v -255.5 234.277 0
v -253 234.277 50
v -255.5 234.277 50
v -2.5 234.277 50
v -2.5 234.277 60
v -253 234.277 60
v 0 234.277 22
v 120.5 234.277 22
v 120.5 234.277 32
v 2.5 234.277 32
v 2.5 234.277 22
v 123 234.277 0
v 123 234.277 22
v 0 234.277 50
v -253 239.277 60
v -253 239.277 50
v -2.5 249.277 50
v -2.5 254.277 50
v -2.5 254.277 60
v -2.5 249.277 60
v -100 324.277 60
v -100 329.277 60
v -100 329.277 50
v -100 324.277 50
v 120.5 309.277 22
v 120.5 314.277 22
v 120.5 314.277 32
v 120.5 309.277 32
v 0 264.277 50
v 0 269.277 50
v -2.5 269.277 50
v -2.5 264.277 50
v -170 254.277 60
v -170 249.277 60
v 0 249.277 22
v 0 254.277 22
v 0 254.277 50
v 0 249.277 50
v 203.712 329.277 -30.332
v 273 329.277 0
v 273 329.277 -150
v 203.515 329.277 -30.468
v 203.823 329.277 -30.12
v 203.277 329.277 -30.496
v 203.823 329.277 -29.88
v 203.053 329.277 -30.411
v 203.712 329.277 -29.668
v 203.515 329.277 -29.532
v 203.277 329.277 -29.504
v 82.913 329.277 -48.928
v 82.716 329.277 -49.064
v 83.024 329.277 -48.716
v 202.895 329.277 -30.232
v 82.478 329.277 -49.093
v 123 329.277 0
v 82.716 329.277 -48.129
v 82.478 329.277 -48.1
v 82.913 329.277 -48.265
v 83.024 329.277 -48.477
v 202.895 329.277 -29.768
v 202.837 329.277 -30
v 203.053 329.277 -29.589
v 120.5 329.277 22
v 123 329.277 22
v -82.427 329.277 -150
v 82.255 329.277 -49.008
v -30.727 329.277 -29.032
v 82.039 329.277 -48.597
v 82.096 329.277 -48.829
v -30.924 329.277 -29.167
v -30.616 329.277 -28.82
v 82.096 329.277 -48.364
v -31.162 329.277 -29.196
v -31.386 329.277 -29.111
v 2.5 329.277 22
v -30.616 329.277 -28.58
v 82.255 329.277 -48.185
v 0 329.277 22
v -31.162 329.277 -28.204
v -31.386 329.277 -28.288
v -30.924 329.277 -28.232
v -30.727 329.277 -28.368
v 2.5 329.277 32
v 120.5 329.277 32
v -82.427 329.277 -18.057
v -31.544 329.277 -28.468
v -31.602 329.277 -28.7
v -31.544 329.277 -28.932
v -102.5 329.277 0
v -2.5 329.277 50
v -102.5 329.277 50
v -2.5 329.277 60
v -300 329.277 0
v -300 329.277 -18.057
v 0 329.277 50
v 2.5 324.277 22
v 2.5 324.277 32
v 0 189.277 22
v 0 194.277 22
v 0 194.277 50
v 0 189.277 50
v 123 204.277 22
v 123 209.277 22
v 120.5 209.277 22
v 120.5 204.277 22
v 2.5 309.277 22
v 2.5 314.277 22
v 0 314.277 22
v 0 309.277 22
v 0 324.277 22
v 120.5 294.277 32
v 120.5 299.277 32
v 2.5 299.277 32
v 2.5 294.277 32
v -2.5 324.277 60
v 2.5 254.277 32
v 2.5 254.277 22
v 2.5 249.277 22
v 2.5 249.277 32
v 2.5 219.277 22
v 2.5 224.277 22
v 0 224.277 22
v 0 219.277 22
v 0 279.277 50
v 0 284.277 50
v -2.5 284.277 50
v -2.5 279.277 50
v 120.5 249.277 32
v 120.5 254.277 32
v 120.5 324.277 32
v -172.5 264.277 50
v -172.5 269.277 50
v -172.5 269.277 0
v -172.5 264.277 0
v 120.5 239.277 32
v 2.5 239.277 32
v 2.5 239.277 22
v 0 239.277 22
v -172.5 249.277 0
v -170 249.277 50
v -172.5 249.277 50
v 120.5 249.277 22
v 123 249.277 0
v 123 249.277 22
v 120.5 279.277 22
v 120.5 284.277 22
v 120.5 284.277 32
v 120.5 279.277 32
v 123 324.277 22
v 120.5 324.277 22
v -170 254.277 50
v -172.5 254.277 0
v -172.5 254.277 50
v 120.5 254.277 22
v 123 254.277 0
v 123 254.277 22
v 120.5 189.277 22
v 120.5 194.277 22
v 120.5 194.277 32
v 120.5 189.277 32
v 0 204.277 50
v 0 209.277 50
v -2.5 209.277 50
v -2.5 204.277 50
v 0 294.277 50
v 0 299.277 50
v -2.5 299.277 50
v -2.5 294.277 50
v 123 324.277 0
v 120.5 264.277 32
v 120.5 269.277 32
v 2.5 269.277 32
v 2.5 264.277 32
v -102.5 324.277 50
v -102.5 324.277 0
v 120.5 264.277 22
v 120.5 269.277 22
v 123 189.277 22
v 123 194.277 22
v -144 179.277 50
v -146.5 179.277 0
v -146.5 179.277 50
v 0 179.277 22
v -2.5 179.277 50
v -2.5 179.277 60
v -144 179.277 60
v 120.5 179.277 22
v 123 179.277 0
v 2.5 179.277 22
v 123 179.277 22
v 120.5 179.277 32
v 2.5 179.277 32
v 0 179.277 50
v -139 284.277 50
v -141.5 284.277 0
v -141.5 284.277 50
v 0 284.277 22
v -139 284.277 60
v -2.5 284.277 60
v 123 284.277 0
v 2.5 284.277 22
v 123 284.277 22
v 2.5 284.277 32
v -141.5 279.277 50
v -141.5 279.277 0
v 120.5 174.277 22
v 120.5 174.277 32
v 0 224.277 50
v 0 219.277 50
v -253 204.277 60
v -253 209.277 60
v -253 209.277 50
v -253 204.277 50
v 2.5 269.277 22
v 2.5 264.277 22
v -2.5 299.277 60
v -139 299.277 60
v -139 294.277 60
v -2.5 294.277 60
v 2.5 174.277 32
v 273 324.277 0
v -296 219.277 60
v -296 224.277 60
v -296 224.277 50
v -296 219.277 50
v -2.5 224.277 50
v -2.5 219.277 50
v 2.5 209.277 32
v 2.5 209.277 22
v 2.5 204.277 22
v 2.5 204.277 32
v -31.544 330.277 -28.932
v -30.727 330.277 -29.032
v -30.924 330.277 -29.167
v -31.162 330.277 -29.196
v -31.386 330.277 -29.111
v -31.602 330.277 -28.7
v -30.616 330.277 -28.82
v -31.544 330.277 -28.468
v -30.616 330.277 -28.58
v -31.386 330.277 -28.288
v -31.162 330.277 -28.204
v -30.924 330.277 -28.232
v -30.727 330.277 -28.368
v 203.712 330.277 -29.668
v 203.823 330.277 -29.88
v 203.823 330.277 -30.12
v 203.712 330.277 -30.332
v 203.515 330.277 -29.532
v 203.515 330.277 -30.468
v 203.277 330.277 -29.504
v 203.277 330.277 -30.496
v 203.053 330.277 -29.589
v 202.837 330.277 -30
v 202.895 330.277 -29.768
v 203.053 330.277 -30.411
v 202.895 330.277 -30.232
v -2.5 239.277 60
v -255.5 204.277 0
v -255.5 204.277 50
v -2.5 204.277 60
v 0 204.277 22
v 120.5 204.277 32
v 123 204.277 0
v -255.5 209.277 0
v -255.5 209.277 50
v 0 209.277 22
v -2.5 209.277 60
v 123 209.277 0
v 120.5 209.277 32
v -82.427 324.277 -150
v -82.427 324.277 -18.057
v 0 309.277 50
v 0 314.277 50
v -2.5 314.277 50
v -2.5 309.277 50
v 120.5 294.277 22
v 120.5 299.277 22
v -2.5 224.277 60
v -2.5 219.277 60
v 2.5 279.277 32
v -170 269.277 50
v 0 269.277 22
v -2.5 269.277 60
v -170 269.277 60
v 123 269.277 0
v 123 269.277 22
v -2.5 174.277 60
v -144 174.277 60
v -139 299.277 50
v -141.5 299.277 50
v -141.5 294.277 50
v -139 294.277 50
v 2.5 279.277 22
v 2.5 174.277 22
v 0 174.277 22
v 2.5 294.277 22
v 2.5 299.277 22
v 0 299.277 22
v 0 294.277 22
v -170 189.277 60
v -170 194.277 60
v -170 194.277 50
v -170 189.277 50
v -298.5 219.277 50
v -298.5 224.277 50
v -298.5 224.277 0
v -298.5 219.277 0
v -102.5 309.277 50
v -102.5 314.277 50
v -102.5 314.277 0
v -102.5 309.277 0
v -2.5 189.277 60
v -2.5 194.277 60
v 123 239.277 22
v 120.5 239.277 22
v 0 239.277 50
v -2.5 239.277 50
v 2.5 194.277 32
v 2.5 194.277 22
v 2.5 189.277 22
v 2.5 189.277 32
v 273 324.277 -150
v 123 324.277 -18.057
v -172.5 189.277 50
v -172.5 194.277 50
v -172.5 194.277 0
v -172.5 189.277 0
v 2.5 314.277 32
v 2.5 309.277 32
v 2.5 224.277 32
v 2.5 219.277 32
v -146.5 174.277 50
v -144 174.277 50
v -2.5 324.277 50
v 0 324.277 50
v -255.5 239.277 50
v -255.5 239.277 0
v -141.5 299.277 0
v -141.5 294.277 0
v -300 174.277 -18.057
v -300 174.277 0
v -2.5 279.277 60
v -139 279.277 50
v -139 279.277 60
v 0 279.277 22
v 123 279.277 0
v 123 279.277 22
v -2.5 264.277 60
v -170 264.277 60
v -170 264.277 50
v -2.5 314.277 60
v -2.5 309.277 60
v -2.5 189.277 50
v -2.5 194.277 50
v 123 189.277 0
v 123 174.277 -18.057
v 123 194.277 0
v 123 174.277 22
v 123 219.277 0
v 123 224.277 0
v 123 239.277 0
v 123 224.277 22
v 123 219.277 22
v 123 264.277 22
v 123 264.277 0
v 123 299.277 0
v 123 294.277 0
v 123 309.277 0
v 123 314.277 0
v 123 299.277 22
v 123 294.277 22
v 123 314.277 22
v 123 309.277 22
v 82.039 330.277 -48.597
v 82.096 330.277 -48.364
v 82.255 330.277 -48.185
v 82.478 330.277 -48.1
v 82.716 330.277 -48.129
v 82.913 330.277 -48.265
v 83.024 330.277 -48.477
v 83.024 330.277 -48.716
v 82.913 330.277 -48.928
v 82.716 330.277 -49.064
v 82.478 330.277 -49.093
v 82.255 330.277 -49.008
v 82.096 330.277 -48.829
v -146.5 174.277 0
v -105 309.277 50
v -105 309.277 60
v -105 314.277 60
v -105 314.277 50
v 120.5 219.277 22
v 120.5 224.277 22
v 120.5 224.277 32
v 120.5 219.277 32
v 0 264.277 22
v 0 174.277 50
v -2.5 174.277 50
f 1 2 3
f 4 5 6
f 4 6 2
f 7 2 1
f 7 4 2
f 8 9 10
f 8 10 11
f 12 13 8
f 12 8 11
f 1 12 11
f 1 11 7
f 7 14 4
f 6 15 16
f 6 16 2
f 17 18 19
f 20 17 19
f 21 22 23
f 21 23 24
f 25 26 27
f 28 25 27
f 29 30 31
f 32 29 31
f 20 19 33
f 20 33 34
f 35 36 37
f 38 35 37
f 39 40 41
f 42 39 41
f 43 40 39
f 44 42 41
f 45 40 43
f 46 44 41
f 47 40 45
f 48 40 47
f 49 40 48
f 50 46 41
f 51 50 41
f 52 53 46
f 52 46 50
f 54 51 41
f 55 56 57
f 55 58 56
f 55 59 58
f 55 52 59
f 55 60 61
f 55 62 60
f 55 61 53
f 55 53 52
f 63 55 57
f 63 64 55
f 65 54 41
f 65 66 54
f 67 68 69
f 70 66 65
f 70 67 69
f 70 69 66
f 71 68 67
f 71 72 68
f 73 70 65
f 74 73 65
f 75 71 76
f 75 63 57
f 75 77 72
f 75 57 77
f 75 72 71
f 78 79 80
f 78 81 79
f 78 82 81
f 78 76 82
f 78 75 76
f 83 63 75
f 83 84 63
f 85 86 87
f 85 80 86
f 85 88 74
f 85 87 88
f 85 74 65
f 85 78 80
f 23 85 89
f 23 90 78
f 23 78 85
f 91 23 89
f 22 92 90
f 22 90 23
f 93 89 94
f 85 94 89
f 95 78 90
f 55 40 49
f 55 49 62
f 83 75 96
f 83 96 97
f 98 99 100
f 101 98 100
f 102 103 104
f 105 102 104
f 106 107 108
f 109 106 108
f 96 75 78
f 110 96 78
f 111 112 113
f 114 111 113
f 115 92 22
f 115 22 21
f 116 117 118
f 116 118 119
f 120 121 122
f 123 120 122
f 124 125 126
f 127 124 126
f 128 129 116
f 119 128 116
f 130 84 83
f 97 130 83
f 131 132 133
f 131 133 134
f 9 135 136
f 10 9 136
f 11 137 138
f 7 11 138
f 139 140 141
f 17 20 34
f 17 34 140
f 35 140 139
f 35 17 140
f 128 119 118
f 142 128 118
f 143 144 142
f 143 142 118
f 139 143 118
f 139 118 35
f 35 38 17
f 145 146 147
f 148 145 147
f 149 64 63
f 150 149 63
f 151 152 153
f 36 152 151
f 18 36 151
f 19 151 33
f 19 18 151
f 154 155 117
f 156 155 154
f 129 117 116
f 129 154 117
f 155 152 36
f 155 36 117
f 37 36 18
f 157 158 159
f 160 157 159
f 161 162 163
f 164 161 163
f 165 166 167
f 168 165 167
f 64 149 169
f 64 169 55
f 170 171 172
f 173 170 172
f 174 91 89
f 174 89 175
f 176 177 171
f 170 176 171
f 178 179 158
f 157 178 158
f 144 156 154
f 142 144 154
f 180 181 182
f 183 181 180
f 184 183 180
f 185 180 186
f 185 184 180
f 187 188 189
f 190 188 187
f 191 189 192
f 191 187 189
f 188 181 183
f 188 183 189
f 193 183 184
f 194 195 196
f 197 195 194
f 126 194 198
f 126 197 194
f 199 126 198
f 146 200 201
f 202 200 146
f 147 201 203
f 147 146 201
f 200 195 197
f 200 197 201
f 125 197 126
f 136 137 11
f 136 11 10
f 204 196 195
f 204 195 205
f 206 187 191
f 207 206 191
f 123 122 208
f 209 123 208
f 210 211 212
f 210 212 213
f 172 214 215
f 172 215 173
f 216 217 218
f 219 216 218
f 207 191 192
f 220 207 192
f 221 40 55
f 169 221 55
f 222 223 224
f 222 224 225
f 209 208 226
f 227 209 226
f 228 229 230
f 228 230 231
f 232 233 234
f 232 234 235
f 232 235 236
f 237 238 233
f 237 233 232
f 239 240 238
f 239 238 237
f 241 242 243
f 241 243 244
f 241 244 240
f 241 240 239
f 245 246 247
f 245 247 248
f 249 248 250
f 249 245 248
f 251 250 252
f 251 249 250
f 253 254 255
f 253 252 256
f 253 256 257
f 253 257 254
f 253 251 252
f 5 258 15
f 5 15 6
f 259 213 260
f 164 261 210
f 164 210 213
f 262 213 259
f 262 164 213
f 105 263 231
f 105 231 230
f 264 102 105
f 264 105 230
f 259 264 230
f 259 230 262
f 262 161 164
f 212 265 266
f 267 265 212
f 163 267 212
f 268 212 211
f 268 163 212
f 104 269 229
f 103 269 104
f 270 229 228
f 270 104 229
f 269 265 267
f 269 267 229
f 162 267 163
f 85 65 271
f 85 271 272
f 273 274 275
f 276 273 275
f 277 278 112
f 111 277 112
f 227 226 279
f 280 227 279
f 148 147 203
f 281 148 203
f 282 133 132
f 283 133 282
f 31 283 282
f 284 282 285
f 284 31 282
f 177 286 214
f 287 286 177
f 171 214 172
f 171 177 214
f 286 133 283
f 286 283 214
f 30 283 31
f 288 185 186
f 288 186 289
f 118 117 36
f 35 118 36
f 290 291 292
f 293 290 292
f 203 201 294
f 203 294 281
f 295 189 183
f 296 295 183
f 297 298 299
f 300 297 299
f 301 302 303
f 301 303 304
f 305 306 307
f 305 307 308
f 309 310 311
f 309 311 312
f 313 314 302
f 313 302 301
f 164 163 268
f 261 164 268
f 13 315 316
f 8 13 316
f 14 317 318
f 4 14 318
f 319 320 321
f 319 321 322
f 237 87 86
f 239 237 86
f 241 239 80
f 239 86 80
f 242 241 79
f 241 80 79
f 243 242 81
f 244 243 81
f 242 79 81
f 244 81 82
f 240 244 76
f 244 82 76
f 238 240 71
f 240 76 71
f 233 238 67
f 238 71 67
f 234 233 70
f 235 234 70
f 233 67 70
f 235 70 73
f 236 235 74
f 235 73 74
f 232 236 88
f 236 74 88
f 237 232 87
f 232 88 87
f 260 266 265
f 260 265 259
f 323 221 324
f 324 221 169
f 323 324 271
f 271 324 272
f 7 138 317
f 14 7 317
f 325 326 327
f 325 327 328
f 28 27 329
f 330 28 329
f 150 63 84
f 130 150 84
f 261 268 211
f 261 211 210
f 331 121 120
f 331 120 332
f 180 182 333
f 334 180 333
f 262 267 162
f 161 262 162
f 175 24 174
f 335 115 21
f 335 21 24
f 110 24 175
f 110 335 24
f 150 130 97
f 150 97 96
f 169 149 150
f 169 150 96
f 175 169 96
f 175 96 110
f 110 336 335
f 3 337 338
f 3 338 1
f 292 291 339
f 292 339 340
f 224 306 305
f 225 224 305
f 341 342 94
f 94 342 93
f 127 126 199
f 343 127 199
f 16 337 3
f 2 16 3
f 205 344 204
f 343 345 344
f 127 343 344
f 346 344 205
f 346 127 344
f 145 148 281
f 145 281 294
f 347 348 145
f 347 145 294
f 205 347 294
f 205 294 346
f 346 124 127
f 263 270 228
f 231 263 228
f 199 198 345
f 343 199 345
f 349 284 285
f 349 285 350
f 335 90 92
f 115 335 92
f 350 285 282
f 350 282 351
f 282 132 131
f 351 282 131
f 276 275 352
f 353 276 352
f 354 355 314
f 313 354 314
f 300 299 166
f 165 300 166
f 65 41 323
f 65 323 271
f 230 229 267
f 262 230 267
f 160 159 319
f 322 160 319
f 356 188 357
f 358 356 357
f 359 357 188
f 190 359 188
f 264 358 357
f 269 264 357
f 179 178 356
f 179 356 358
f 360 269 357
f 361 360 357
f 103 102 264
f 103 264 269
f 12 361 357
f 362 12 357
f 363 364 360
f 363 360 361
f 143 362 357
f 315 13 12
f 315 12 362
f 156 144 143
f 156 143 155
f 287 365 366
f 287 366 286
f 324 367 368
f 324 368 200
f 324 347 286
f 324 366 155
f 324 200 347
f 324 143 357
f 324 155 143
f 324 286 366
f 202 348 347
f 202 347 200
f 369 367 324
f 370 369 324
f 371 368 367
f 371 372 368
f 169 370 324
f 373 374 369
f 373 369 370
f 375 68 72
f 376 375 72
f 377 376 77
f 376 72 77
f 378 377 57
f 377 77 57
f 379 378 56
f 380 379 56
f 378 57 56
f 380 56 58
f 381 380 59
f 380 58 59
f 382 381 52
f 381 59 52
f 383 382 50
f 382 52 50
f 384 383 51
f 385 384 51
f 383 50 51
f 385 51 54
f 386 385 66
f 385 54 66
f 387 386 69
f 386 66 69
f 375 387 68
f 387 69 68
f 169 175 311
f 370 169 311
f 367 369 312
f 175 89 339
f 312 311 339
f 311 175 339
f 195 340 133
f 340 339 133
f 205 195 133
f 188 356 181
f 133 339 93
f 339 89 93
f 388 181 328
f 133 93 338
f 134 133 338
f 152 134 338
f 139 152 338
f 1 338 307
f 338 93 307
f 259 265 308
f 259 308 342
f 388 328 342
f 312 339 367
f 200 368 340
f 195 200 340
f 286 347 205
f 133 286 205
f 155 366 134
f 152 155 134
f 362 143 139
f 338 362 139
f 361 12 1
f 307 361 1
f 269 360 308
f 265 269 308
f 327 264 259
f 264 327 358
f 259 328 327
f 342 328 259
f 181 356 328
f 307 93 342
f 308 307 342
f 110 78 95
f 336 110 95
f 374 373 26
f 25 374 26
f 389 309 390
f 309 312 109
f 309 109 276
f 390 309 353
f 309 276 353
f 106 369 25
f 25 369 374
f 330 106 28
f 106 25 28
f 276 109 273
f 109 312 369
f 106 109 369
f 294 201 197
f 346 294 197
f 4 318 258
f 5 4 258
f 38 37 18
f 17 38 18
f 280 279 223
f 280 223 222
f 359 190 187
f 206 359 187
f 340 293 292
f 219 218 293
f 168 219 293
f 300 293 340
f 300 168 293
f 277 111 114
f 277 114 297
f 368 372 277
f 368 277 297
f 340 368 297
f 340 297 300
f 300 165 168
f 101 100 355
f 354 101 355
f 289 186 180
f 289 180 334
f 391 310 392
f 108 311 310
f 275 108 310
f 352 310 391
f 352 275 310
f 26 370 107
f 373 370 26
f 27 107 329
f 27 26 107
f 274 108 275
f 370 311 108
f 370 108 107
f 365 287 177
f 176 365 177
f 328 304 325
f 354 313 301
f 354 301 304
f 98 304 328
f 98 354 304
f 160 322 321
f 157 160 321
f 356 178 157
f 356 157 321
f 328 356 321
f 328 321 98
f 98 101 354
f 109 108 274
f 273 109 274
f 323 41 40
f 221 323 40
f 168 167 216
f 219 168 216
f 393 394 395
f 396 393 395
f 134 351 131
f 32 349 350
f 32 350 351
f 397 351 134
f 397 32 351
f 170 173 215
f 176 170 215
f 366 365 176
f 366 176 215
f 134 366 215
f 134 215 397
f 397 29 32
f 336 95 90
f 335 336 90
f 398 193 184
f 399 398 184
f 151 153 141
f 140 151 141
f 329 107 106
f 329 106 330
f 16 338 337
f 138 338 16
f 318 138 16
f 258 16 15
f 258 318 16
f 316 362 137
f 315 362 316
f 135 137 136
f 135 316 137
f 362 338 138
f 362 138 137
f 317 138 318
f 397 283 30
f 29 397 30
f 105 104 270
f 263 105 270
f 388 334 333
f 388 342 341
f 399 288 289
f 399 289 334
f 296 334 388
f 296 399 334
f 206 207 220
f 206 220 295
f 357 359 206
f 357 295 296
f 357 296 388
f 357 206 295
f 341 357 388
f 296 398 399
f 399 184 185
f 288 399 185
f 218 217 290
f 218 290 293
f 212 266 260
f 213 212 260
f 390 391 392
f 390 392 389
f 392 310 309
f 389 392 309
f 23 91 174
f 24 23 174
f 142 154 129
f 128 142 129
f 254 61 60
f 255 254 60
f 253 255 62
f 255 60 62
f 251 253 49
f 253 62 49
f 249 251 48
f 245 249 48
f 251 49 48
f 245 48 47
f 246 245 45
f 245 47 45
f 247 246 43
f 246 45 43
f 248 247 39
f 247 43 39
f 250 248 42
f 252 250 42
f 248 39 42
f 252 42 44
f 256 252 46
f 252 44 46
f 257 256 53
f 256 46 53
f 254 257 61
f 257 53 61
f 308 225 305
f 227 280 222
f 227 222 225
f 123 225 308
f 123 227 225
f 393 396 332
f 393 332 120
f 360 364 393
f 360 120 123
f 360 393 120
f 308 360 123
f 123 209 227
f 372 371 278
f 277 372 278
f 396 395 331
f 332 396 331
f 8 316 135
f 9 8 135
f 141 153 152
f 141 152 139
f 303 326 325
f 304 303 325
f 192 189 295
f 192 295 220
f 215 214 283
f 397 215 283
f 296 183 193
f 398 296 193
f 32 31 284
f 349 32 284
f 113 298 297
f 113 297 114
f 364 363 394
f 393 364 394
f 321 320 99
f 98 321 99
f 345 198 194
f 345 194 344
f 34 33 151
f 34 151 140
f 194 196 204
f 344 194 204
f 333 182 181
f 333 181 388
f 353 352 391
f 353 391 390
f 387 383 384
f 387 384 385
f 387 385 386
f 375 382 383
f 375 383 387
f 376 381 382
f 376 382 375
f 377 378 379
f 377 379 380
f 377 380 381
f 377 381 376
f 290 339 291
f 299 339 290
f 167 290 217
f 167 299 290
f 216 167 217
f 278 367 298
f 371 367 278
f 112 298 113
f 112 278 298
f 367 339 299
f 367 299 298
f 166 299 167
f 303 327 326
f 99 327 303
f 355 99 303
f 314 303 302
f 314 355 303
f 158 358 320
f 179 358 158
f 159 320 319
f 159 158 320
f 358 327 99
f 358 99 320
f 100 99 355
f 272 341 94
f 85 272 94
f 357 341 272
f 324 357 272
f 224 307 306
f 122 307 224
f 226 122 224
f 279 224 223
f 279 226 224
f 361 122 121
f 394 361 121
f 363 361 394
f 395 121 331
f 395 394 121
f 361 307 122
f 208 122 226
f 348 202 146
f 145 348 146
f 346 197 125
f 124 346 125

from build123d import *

# Parameters (mm, degrees)
F1_DEPTH  = 123
F2_DEPTH  = 300
F3_R      = 0.5
F4_DEPTH  = 1
F5_W      = 123
F5_H      = 28
F6_DEPTH  = 300
F7_W      = 2.5
F7_H      = 10
F8_DEPTH  = 300
F9_W      = 150
F9_H      = 150
F10_DEPTH = 5
F11_W     = 5
F11_H     = 60
F12_DEPTH = 197.5
F13_W     = 20
F13_H     = 60
F14_DEPTH = 158.5
F15_W     = 20
F15_H     = 60
F15_W_2   = 5
F16_DEPTH = 127.5
F17_W     = 5
F17_H     = 60
F18_DEPTH = 44.5
F19_W     = 5
F19_H     = 60
F20_DEPTH = 1.5
F21_W     = 5
F21_H     = 60
F22_DEPTH = 153.5
F23_W     = 5
F23_H     = 10
F24_DEPTH = 2.5
F25_W     = 5
F25_H     = 10
F26_DEPTH = 2.5
F27_W     = 5
F27_H     = 10
F28_DEPTH = 2.5
F29_W     = 5
F29_H     = 10
F30_DEPTH = 2.5
F31_W     = 5
F31_H     = 10
F32_DEPTH = 2.5
F33_W     = 5
F33_H     = 10
F34_DEPTH = 2.5
F35_W     = 5
F35_H     = 10
F36_DEPTH = 2.5
F37_W     = 5
F37_H     = 10
F38_DEPTH = 2.5
F39_W     = 5
F39_H     = 10
F40_DEPTH = 2.5
F41_W     = 5
F41_H     = 10
F42_DEPTH = 2.5
F43_W     = 5
F43_H     = 10
F44_DEPTH = 2.5
F45_W     = 217.5729006529
F45_H     = 131.9425046444
F46_DEPTH = 5


# Not quite as in the source:
# - a feature names something its author has since deleted; it is built from what else it names


with BuildPart() as f1:
    # F0 (on Right) → F1 (new body)
    with BuildSketch(Plane.YZ):
        Polygon((179.2768240368, 60), (174.2768240368, 60), (174.2768240368, -18.0574953556), (324.2768240368, -18.0574953556), (324.2768240368, -150), (329.2768240368, -150), (329.2768240368, 60), (324.2768240368, 60), (324.2768240368, 0), (314.2768240368, 0), (314.2768240368, 60), (309.2768240368, 60), (309.2768240368, 0), (299.2768240368, 0), (299.2768240368, 60), (294.2768240368, 60), (294.2768240368, 0), (284.2768240368, 0), (284.2768240368, 60), (279.2768240368, 60), (279.2768240368, 0), (269.2768240368, 0), (269.2768240368, 60), (264.2768240368, 60), (264.2768240368, 0), (254.2768240368, 0), (254.2768240368, 60), (249.2768240368, 60), (249.2768240368, 0), (239.2768240368, 0), (239.2768240368, 60), (234.2768240368, 60), (234.2768240368, 0), (224.2768240368, 0), (224.2768240368, 60), (219.2768240368, 60), (219.2768240368, 0), (209.2768240368, 0), (209.2768240368, 60), (204.2768240368, 60), (204.2768240368, 0), (194.2768240368, 0), (194.2768240368, 60), (189.2768240368, 60), (189.2768240368, 0), (179.2768240368, 0), align=None)
    extrude(amount=F1_DEPTH)

    # F0 (on Right) → F2 (join)
    with BuildSketch(Plane.YZ):
        Polygon((179.2768240368, 60), (174.2768240368, 60), (174.2768240368, -18.0574953556), (324.2768240368, -18.0574953556), (324.2768240368, -150), (329.2768240368, -150), (329.2768240368, 60), (324.2768240368, 60), (324.2768240368, 0), (314.2768240368, 0), (314.2768240368, 60), (309.2768240368, 60), (309.2768240368, 0), (299.2768240368, 0), (299.2768240368, 60), (294.2768240368, 60), (294.2768240368, 0), (284.2768240368, 0), (284.2768240368, 60), (279.2768240368, 60), (279.2768240368, 0), (269.2768240368, 0), (269.2768240368, 60), (264.2768240368, 60), (264.2768240368, 0), (254.2768240368, 0), (254.2768240368, 60), (249.2768240368, 60), (249.2768240368, 0), (239.2768240368, 0), (239.2768240368, 60), (234.2768240368, 60), (234.2768240368, 0), (224.2768240368, 0), (224.2768240368, 60), (219.2768240368, 60), (219.2768240368, 0), (209.2768240368, 0), (209.2768240368, 60), (204.2768240368, 60), (204.2768240368, 0), (194.2768240368, 0), (194.2768240368, 60), (189.2768240368, 60), (189.2768240368, 0), (179.2768240368, 0), align=None)
    extrude(amount=-F2_DEPTH)

    # F3 (on face) → F4, piece 2 (join)
    with BuildSketch(Plane(origin=(0, 329.2768240368, 0), x_dir=(-1, 0, 0), z_dir=(0, 1, 0))):
        with Locations((-82.5385674834, -48.5965646803)):
            Circle(F3_R)
        with Locations((31.1017241329, -28.6999493837)):
            Circle(F3_R)
    extrude(amount=F4_DEPTH)

    # F5 (on face) → F6 (cut)
    with BuildSketch(Plane(origin=(0, 329.2768240368, 0), x_dir=(-1, 0, 0), z_dir=(0, 1, 0))):
        with Locations((-61.5, 46)):
            Rectangle(F5_W, F5_H)
    extrude(amount=-F6_DEPTH, mode=Mode.SUBTRACT)

    # F7 (on face) → F8 (cut)
    with BuildSketch(Plane(origin=(0, 329.2768240368, 0), x_dir=(-1, 0, 0), z_dir=(0, 1, 0))):
        with Locations((-1.25, 27)):
            Rectangle(F7_W, F7_H)
        with Locations((1.25, 55)):
            Rectangle(F7_W, F7_H)
        with Locations((-121.75, 27)):
            Rectangle(F7_W, F7_H)
    extrude(amount=-F8_DEPTH, mode=Mode.SUBTRACT)



with BuildPart() as f4:
    # F3 (on face) → F4 (new body)
    with BuildSketch(Plane(origin=(0, 329.2768240368, 0), x_dir=(-1, 0, 0), z_dir=(0, 1, 0))):
        with Locations((-203.3374607563, -30)):
            Circle(F3_R)
    extrude(amount=F4_DEPTH)


with BuildPart() as f1_1:
    add(f1.part)

    add(f4.part)  # F10 merges F4
    # F9 (on face) → F10 (join)
    with BuildSketch(Plane(origin=(0, 329.2768240368, 0), x_dir=(-1, 0, 0), z_dir=(0, 1, 0))):
        with Locations((-198, -75)):
            Rectangle(F9_W, F9_H)
    extrude(amount=-F10_DEPTH)

    # F11 (on face) → F12 (cut)
    with BuildSketch(Plane(origin=(-300, 0, 0), x_dir=(0, -1, 0), z_dir=(-1, 0, 0))):
        with Locations((-326.7768240368, 30)):
            Rectangle(F11_W, F11_H)
        with Locations((-311.7768240368, 30)):
            Rectangle(F11_W, F11_H)
    extrude(amount=-F12_DEPTH, mode=Mode.SUBTRACT)

    # F13 (on face) → F14 (cut)
    with BuildSketch(Plane(origin=(-300, 0, 0), x_dir=(0, -1, 0), z_dir=(-1, 0, 0))):
        with Locations((-289.2768240368, 30)):
            Rectangle(F13_W, F13_H)
    extrude(amount=-F14_DEPTH, mode=Mode.SUBTRACT)

    # F15 (on face) → F16 (cut)
    with BuildSketch(Plane(origin=(-300, 0, 0), x_dir=(0, -1, 0), z_dir=(-1, 0, 0))):
        with Locations((-259.2768240368, 30)):
            Rectangle(F15_W, F15_H)
        with Locations((-191.7768240368, 30)):
            Rectangle(F15_W_2, F15_H)
    extrude(amount=-F16_DEPTH, mode=Mode.SUBTRACT)

    # F17 (on face) → F18 (cut)
    with BuildSketch(Plane(origin=(-300, 0, 0), x_dir=(0, -1, 0), z_dir=(-1, 0, 0))):
        with Locations((-236.7768240368, 30)):
            Rectangle(F17_W, F17_H)
        with Locations((-206.7768240368, 30)):
            Rectangle(F17_W, F17_H)
    extrude(amount=-F18_DEPTH, mode=Mode.SUBTRACT)

    # F19 (on face) → F20 (cut)
    with BuildSketch(Plane(origin=(-300, 0, 0), x_dir=(0, -1, 0), z_dir=(-1, 0, 0))):
        with Locations((-221.7768240368, 30)):
            Rectangle(F19_W, F19_H)
    extrude(amount=-F20_DEPTH, mode=Mode.SUBTRACT)

    # F21 (on face) → F22 (cut)
    with BuildSketch(Plane(origin=(-300, 0, 0), x_dir=(0, -1, 0), z_dir=(-1, 0, 0))):
        with Locations((-176.7768240368, 30)):
            Rectangle(F21_W, F21_H)
    extrude(amount=-F22_DEPTH, mode=Mode.SUBTRACT)

    # F23 (on face) → F24 (cut)
    with BuildSketch(Plane(origin=(-298.5, 0, 0), x_dir=(0, -1, 0), z_dir=(-1, 0, 0))):
        with Locations((-221.7768240368, 55)):
            Rectangle(F23_W, F23_H)
    extrude(amount=-F24_DEPTH, mode=Mode.SUBTRACT)

    # F25 (on face) → F26 (cut)
    with BuildSketch(Plane(origin=(-255.5, 0, 0), x_dir=(0, -1, 0), z_dir=(-1, 0, 0))):
        with Locations((-236.7768240368, 55)):
            Rectangle(F25_W, F25_H)
    extrude(amount=-F26_DEPTH, mode=Mode.SUBTRACT)

    # F27 (on face) → F28 (cut)
    with BuildSketch(Plane(origin=(-255.5, 0, 0), x_dir=(0, -1, 0), z_dir=(-1, 0, 0))):
        with Locations((-206.7768240368, 55)):
            Rectangle(F27_W, F27_H)
    extrude(amount=-F28_DEPTH, mode=Mode.SUBTRACT)

    # F29 (on face) → F30 (cut)
    with BuildSketch(Plane(origin=(-172.5, 0, 0), x_dir=(0, -1, 0), z_dir=(-1, 0, 0))):
        with Locations((-251.7768240368, 55)):
            Rectangle(F29_W, F29_H)
    extrude(amount=-F30_DEPTH, mode=Mode.SUBTRACT)

    # F31 (on face) → F32 (cut)
    with BuildSketch(Plane(origin=(-172.5, 0, 0), x_dir=(0, -1, 0), z_dir=(-1, 0, 0))):
        with Locations((-191.7768240368, 55)):
            Rectangle(F31_W, F31_H)
    extrude(amount=-F32_DEPTH, mode=Mode.SUBTRACT)

    # F33 (on face) → F34 (cut)
    with BuildSketch(Plane(origin=(-172.5, 0, 0), x_dir=(0, -1, 0), z_dir=(-1, 0, 0))):
        with Locations((-266.7768240368, 55)):
            Rectangle(F33_W, F33_H)
    extrude(amount=-F34_DEPTH, mode=Mode.SUBTRACT)

    # F35 (on face) → F36 (cut)
    with BuildSketch(Plane(origin=(-146.5, 0, 0), x_dir=(0, -1, 0), z_dir=(-1, 0, 0))):
        with Locations((-176.7768240368, 55)):
            Rectangle(F35_W, F35_H)
    extrude(amount=-F36_DEPTH, mode=Mode.SUBTRACT)

    # F37 (on face) → F38 (cut)
    with BuildSketch(Plane(origin=(-141.5, 0, 0), x_dir=(0, -1, 0), z_dir=(-1, 0, 0))):
        with Locations((-281.7768240368, 55)):
            Rectangle(F37_W, F37_H)
    extrude(amount=-F38_DEPTH, mode=Mode.SUBTRACT)

    # F39 (on face) → F40 (cut)
    with BuildSketch(Plane(origin=(-141.5, 0, 0), x_dir=(0, -1, 0), z_dir=(-1, 0, 0))):
        with Locations((-296.7768240368, 55)):
            Rectangle(F39_W, F39_H)
    extrude(amount=-F40_DEPTH, mode=Mode.SUBTRACT)

    # F41 (on face) → F42 (join)
    with BuildSketch(Plane(origin=(-102.5, 0, 0), x_dir=(0, -1, 0), z_dir=(-1, 0, 0))):
        with Locations((-311.7768240368, 55)):
            Rectangle(F41_W, F41_H)
    extrude(amount=F42_DEPTH)

    # F43 (on face) → F44 (cut)
    with BuildSketch(Plane(origin=(-102.5, 0, 0), x_dir=(0, -1, 0), z_dir=(-1, 0, 0))):
        with Locations((-326.7768240368, 55)):
            Rectangle(F43_W, F43_H)
    extrude(amount=-F44_DEPTH, mode=Mode.SUBTRACT)

    # F45 (on face) → F46 (cut)
    with BuildSketch(Plane(origin=(0, 329.2768240368, 0), x_dir=(-1, 0, 0), z_dir=(0, 1, 0))):
        with Locations((191.2135496736, -84.0287476778)):
            Rectangle(F45_W, F45_H)
    extrude(amount=-F46_DEPTH, mode=Mode.SUBTRACT)


solid = f1_1.part
